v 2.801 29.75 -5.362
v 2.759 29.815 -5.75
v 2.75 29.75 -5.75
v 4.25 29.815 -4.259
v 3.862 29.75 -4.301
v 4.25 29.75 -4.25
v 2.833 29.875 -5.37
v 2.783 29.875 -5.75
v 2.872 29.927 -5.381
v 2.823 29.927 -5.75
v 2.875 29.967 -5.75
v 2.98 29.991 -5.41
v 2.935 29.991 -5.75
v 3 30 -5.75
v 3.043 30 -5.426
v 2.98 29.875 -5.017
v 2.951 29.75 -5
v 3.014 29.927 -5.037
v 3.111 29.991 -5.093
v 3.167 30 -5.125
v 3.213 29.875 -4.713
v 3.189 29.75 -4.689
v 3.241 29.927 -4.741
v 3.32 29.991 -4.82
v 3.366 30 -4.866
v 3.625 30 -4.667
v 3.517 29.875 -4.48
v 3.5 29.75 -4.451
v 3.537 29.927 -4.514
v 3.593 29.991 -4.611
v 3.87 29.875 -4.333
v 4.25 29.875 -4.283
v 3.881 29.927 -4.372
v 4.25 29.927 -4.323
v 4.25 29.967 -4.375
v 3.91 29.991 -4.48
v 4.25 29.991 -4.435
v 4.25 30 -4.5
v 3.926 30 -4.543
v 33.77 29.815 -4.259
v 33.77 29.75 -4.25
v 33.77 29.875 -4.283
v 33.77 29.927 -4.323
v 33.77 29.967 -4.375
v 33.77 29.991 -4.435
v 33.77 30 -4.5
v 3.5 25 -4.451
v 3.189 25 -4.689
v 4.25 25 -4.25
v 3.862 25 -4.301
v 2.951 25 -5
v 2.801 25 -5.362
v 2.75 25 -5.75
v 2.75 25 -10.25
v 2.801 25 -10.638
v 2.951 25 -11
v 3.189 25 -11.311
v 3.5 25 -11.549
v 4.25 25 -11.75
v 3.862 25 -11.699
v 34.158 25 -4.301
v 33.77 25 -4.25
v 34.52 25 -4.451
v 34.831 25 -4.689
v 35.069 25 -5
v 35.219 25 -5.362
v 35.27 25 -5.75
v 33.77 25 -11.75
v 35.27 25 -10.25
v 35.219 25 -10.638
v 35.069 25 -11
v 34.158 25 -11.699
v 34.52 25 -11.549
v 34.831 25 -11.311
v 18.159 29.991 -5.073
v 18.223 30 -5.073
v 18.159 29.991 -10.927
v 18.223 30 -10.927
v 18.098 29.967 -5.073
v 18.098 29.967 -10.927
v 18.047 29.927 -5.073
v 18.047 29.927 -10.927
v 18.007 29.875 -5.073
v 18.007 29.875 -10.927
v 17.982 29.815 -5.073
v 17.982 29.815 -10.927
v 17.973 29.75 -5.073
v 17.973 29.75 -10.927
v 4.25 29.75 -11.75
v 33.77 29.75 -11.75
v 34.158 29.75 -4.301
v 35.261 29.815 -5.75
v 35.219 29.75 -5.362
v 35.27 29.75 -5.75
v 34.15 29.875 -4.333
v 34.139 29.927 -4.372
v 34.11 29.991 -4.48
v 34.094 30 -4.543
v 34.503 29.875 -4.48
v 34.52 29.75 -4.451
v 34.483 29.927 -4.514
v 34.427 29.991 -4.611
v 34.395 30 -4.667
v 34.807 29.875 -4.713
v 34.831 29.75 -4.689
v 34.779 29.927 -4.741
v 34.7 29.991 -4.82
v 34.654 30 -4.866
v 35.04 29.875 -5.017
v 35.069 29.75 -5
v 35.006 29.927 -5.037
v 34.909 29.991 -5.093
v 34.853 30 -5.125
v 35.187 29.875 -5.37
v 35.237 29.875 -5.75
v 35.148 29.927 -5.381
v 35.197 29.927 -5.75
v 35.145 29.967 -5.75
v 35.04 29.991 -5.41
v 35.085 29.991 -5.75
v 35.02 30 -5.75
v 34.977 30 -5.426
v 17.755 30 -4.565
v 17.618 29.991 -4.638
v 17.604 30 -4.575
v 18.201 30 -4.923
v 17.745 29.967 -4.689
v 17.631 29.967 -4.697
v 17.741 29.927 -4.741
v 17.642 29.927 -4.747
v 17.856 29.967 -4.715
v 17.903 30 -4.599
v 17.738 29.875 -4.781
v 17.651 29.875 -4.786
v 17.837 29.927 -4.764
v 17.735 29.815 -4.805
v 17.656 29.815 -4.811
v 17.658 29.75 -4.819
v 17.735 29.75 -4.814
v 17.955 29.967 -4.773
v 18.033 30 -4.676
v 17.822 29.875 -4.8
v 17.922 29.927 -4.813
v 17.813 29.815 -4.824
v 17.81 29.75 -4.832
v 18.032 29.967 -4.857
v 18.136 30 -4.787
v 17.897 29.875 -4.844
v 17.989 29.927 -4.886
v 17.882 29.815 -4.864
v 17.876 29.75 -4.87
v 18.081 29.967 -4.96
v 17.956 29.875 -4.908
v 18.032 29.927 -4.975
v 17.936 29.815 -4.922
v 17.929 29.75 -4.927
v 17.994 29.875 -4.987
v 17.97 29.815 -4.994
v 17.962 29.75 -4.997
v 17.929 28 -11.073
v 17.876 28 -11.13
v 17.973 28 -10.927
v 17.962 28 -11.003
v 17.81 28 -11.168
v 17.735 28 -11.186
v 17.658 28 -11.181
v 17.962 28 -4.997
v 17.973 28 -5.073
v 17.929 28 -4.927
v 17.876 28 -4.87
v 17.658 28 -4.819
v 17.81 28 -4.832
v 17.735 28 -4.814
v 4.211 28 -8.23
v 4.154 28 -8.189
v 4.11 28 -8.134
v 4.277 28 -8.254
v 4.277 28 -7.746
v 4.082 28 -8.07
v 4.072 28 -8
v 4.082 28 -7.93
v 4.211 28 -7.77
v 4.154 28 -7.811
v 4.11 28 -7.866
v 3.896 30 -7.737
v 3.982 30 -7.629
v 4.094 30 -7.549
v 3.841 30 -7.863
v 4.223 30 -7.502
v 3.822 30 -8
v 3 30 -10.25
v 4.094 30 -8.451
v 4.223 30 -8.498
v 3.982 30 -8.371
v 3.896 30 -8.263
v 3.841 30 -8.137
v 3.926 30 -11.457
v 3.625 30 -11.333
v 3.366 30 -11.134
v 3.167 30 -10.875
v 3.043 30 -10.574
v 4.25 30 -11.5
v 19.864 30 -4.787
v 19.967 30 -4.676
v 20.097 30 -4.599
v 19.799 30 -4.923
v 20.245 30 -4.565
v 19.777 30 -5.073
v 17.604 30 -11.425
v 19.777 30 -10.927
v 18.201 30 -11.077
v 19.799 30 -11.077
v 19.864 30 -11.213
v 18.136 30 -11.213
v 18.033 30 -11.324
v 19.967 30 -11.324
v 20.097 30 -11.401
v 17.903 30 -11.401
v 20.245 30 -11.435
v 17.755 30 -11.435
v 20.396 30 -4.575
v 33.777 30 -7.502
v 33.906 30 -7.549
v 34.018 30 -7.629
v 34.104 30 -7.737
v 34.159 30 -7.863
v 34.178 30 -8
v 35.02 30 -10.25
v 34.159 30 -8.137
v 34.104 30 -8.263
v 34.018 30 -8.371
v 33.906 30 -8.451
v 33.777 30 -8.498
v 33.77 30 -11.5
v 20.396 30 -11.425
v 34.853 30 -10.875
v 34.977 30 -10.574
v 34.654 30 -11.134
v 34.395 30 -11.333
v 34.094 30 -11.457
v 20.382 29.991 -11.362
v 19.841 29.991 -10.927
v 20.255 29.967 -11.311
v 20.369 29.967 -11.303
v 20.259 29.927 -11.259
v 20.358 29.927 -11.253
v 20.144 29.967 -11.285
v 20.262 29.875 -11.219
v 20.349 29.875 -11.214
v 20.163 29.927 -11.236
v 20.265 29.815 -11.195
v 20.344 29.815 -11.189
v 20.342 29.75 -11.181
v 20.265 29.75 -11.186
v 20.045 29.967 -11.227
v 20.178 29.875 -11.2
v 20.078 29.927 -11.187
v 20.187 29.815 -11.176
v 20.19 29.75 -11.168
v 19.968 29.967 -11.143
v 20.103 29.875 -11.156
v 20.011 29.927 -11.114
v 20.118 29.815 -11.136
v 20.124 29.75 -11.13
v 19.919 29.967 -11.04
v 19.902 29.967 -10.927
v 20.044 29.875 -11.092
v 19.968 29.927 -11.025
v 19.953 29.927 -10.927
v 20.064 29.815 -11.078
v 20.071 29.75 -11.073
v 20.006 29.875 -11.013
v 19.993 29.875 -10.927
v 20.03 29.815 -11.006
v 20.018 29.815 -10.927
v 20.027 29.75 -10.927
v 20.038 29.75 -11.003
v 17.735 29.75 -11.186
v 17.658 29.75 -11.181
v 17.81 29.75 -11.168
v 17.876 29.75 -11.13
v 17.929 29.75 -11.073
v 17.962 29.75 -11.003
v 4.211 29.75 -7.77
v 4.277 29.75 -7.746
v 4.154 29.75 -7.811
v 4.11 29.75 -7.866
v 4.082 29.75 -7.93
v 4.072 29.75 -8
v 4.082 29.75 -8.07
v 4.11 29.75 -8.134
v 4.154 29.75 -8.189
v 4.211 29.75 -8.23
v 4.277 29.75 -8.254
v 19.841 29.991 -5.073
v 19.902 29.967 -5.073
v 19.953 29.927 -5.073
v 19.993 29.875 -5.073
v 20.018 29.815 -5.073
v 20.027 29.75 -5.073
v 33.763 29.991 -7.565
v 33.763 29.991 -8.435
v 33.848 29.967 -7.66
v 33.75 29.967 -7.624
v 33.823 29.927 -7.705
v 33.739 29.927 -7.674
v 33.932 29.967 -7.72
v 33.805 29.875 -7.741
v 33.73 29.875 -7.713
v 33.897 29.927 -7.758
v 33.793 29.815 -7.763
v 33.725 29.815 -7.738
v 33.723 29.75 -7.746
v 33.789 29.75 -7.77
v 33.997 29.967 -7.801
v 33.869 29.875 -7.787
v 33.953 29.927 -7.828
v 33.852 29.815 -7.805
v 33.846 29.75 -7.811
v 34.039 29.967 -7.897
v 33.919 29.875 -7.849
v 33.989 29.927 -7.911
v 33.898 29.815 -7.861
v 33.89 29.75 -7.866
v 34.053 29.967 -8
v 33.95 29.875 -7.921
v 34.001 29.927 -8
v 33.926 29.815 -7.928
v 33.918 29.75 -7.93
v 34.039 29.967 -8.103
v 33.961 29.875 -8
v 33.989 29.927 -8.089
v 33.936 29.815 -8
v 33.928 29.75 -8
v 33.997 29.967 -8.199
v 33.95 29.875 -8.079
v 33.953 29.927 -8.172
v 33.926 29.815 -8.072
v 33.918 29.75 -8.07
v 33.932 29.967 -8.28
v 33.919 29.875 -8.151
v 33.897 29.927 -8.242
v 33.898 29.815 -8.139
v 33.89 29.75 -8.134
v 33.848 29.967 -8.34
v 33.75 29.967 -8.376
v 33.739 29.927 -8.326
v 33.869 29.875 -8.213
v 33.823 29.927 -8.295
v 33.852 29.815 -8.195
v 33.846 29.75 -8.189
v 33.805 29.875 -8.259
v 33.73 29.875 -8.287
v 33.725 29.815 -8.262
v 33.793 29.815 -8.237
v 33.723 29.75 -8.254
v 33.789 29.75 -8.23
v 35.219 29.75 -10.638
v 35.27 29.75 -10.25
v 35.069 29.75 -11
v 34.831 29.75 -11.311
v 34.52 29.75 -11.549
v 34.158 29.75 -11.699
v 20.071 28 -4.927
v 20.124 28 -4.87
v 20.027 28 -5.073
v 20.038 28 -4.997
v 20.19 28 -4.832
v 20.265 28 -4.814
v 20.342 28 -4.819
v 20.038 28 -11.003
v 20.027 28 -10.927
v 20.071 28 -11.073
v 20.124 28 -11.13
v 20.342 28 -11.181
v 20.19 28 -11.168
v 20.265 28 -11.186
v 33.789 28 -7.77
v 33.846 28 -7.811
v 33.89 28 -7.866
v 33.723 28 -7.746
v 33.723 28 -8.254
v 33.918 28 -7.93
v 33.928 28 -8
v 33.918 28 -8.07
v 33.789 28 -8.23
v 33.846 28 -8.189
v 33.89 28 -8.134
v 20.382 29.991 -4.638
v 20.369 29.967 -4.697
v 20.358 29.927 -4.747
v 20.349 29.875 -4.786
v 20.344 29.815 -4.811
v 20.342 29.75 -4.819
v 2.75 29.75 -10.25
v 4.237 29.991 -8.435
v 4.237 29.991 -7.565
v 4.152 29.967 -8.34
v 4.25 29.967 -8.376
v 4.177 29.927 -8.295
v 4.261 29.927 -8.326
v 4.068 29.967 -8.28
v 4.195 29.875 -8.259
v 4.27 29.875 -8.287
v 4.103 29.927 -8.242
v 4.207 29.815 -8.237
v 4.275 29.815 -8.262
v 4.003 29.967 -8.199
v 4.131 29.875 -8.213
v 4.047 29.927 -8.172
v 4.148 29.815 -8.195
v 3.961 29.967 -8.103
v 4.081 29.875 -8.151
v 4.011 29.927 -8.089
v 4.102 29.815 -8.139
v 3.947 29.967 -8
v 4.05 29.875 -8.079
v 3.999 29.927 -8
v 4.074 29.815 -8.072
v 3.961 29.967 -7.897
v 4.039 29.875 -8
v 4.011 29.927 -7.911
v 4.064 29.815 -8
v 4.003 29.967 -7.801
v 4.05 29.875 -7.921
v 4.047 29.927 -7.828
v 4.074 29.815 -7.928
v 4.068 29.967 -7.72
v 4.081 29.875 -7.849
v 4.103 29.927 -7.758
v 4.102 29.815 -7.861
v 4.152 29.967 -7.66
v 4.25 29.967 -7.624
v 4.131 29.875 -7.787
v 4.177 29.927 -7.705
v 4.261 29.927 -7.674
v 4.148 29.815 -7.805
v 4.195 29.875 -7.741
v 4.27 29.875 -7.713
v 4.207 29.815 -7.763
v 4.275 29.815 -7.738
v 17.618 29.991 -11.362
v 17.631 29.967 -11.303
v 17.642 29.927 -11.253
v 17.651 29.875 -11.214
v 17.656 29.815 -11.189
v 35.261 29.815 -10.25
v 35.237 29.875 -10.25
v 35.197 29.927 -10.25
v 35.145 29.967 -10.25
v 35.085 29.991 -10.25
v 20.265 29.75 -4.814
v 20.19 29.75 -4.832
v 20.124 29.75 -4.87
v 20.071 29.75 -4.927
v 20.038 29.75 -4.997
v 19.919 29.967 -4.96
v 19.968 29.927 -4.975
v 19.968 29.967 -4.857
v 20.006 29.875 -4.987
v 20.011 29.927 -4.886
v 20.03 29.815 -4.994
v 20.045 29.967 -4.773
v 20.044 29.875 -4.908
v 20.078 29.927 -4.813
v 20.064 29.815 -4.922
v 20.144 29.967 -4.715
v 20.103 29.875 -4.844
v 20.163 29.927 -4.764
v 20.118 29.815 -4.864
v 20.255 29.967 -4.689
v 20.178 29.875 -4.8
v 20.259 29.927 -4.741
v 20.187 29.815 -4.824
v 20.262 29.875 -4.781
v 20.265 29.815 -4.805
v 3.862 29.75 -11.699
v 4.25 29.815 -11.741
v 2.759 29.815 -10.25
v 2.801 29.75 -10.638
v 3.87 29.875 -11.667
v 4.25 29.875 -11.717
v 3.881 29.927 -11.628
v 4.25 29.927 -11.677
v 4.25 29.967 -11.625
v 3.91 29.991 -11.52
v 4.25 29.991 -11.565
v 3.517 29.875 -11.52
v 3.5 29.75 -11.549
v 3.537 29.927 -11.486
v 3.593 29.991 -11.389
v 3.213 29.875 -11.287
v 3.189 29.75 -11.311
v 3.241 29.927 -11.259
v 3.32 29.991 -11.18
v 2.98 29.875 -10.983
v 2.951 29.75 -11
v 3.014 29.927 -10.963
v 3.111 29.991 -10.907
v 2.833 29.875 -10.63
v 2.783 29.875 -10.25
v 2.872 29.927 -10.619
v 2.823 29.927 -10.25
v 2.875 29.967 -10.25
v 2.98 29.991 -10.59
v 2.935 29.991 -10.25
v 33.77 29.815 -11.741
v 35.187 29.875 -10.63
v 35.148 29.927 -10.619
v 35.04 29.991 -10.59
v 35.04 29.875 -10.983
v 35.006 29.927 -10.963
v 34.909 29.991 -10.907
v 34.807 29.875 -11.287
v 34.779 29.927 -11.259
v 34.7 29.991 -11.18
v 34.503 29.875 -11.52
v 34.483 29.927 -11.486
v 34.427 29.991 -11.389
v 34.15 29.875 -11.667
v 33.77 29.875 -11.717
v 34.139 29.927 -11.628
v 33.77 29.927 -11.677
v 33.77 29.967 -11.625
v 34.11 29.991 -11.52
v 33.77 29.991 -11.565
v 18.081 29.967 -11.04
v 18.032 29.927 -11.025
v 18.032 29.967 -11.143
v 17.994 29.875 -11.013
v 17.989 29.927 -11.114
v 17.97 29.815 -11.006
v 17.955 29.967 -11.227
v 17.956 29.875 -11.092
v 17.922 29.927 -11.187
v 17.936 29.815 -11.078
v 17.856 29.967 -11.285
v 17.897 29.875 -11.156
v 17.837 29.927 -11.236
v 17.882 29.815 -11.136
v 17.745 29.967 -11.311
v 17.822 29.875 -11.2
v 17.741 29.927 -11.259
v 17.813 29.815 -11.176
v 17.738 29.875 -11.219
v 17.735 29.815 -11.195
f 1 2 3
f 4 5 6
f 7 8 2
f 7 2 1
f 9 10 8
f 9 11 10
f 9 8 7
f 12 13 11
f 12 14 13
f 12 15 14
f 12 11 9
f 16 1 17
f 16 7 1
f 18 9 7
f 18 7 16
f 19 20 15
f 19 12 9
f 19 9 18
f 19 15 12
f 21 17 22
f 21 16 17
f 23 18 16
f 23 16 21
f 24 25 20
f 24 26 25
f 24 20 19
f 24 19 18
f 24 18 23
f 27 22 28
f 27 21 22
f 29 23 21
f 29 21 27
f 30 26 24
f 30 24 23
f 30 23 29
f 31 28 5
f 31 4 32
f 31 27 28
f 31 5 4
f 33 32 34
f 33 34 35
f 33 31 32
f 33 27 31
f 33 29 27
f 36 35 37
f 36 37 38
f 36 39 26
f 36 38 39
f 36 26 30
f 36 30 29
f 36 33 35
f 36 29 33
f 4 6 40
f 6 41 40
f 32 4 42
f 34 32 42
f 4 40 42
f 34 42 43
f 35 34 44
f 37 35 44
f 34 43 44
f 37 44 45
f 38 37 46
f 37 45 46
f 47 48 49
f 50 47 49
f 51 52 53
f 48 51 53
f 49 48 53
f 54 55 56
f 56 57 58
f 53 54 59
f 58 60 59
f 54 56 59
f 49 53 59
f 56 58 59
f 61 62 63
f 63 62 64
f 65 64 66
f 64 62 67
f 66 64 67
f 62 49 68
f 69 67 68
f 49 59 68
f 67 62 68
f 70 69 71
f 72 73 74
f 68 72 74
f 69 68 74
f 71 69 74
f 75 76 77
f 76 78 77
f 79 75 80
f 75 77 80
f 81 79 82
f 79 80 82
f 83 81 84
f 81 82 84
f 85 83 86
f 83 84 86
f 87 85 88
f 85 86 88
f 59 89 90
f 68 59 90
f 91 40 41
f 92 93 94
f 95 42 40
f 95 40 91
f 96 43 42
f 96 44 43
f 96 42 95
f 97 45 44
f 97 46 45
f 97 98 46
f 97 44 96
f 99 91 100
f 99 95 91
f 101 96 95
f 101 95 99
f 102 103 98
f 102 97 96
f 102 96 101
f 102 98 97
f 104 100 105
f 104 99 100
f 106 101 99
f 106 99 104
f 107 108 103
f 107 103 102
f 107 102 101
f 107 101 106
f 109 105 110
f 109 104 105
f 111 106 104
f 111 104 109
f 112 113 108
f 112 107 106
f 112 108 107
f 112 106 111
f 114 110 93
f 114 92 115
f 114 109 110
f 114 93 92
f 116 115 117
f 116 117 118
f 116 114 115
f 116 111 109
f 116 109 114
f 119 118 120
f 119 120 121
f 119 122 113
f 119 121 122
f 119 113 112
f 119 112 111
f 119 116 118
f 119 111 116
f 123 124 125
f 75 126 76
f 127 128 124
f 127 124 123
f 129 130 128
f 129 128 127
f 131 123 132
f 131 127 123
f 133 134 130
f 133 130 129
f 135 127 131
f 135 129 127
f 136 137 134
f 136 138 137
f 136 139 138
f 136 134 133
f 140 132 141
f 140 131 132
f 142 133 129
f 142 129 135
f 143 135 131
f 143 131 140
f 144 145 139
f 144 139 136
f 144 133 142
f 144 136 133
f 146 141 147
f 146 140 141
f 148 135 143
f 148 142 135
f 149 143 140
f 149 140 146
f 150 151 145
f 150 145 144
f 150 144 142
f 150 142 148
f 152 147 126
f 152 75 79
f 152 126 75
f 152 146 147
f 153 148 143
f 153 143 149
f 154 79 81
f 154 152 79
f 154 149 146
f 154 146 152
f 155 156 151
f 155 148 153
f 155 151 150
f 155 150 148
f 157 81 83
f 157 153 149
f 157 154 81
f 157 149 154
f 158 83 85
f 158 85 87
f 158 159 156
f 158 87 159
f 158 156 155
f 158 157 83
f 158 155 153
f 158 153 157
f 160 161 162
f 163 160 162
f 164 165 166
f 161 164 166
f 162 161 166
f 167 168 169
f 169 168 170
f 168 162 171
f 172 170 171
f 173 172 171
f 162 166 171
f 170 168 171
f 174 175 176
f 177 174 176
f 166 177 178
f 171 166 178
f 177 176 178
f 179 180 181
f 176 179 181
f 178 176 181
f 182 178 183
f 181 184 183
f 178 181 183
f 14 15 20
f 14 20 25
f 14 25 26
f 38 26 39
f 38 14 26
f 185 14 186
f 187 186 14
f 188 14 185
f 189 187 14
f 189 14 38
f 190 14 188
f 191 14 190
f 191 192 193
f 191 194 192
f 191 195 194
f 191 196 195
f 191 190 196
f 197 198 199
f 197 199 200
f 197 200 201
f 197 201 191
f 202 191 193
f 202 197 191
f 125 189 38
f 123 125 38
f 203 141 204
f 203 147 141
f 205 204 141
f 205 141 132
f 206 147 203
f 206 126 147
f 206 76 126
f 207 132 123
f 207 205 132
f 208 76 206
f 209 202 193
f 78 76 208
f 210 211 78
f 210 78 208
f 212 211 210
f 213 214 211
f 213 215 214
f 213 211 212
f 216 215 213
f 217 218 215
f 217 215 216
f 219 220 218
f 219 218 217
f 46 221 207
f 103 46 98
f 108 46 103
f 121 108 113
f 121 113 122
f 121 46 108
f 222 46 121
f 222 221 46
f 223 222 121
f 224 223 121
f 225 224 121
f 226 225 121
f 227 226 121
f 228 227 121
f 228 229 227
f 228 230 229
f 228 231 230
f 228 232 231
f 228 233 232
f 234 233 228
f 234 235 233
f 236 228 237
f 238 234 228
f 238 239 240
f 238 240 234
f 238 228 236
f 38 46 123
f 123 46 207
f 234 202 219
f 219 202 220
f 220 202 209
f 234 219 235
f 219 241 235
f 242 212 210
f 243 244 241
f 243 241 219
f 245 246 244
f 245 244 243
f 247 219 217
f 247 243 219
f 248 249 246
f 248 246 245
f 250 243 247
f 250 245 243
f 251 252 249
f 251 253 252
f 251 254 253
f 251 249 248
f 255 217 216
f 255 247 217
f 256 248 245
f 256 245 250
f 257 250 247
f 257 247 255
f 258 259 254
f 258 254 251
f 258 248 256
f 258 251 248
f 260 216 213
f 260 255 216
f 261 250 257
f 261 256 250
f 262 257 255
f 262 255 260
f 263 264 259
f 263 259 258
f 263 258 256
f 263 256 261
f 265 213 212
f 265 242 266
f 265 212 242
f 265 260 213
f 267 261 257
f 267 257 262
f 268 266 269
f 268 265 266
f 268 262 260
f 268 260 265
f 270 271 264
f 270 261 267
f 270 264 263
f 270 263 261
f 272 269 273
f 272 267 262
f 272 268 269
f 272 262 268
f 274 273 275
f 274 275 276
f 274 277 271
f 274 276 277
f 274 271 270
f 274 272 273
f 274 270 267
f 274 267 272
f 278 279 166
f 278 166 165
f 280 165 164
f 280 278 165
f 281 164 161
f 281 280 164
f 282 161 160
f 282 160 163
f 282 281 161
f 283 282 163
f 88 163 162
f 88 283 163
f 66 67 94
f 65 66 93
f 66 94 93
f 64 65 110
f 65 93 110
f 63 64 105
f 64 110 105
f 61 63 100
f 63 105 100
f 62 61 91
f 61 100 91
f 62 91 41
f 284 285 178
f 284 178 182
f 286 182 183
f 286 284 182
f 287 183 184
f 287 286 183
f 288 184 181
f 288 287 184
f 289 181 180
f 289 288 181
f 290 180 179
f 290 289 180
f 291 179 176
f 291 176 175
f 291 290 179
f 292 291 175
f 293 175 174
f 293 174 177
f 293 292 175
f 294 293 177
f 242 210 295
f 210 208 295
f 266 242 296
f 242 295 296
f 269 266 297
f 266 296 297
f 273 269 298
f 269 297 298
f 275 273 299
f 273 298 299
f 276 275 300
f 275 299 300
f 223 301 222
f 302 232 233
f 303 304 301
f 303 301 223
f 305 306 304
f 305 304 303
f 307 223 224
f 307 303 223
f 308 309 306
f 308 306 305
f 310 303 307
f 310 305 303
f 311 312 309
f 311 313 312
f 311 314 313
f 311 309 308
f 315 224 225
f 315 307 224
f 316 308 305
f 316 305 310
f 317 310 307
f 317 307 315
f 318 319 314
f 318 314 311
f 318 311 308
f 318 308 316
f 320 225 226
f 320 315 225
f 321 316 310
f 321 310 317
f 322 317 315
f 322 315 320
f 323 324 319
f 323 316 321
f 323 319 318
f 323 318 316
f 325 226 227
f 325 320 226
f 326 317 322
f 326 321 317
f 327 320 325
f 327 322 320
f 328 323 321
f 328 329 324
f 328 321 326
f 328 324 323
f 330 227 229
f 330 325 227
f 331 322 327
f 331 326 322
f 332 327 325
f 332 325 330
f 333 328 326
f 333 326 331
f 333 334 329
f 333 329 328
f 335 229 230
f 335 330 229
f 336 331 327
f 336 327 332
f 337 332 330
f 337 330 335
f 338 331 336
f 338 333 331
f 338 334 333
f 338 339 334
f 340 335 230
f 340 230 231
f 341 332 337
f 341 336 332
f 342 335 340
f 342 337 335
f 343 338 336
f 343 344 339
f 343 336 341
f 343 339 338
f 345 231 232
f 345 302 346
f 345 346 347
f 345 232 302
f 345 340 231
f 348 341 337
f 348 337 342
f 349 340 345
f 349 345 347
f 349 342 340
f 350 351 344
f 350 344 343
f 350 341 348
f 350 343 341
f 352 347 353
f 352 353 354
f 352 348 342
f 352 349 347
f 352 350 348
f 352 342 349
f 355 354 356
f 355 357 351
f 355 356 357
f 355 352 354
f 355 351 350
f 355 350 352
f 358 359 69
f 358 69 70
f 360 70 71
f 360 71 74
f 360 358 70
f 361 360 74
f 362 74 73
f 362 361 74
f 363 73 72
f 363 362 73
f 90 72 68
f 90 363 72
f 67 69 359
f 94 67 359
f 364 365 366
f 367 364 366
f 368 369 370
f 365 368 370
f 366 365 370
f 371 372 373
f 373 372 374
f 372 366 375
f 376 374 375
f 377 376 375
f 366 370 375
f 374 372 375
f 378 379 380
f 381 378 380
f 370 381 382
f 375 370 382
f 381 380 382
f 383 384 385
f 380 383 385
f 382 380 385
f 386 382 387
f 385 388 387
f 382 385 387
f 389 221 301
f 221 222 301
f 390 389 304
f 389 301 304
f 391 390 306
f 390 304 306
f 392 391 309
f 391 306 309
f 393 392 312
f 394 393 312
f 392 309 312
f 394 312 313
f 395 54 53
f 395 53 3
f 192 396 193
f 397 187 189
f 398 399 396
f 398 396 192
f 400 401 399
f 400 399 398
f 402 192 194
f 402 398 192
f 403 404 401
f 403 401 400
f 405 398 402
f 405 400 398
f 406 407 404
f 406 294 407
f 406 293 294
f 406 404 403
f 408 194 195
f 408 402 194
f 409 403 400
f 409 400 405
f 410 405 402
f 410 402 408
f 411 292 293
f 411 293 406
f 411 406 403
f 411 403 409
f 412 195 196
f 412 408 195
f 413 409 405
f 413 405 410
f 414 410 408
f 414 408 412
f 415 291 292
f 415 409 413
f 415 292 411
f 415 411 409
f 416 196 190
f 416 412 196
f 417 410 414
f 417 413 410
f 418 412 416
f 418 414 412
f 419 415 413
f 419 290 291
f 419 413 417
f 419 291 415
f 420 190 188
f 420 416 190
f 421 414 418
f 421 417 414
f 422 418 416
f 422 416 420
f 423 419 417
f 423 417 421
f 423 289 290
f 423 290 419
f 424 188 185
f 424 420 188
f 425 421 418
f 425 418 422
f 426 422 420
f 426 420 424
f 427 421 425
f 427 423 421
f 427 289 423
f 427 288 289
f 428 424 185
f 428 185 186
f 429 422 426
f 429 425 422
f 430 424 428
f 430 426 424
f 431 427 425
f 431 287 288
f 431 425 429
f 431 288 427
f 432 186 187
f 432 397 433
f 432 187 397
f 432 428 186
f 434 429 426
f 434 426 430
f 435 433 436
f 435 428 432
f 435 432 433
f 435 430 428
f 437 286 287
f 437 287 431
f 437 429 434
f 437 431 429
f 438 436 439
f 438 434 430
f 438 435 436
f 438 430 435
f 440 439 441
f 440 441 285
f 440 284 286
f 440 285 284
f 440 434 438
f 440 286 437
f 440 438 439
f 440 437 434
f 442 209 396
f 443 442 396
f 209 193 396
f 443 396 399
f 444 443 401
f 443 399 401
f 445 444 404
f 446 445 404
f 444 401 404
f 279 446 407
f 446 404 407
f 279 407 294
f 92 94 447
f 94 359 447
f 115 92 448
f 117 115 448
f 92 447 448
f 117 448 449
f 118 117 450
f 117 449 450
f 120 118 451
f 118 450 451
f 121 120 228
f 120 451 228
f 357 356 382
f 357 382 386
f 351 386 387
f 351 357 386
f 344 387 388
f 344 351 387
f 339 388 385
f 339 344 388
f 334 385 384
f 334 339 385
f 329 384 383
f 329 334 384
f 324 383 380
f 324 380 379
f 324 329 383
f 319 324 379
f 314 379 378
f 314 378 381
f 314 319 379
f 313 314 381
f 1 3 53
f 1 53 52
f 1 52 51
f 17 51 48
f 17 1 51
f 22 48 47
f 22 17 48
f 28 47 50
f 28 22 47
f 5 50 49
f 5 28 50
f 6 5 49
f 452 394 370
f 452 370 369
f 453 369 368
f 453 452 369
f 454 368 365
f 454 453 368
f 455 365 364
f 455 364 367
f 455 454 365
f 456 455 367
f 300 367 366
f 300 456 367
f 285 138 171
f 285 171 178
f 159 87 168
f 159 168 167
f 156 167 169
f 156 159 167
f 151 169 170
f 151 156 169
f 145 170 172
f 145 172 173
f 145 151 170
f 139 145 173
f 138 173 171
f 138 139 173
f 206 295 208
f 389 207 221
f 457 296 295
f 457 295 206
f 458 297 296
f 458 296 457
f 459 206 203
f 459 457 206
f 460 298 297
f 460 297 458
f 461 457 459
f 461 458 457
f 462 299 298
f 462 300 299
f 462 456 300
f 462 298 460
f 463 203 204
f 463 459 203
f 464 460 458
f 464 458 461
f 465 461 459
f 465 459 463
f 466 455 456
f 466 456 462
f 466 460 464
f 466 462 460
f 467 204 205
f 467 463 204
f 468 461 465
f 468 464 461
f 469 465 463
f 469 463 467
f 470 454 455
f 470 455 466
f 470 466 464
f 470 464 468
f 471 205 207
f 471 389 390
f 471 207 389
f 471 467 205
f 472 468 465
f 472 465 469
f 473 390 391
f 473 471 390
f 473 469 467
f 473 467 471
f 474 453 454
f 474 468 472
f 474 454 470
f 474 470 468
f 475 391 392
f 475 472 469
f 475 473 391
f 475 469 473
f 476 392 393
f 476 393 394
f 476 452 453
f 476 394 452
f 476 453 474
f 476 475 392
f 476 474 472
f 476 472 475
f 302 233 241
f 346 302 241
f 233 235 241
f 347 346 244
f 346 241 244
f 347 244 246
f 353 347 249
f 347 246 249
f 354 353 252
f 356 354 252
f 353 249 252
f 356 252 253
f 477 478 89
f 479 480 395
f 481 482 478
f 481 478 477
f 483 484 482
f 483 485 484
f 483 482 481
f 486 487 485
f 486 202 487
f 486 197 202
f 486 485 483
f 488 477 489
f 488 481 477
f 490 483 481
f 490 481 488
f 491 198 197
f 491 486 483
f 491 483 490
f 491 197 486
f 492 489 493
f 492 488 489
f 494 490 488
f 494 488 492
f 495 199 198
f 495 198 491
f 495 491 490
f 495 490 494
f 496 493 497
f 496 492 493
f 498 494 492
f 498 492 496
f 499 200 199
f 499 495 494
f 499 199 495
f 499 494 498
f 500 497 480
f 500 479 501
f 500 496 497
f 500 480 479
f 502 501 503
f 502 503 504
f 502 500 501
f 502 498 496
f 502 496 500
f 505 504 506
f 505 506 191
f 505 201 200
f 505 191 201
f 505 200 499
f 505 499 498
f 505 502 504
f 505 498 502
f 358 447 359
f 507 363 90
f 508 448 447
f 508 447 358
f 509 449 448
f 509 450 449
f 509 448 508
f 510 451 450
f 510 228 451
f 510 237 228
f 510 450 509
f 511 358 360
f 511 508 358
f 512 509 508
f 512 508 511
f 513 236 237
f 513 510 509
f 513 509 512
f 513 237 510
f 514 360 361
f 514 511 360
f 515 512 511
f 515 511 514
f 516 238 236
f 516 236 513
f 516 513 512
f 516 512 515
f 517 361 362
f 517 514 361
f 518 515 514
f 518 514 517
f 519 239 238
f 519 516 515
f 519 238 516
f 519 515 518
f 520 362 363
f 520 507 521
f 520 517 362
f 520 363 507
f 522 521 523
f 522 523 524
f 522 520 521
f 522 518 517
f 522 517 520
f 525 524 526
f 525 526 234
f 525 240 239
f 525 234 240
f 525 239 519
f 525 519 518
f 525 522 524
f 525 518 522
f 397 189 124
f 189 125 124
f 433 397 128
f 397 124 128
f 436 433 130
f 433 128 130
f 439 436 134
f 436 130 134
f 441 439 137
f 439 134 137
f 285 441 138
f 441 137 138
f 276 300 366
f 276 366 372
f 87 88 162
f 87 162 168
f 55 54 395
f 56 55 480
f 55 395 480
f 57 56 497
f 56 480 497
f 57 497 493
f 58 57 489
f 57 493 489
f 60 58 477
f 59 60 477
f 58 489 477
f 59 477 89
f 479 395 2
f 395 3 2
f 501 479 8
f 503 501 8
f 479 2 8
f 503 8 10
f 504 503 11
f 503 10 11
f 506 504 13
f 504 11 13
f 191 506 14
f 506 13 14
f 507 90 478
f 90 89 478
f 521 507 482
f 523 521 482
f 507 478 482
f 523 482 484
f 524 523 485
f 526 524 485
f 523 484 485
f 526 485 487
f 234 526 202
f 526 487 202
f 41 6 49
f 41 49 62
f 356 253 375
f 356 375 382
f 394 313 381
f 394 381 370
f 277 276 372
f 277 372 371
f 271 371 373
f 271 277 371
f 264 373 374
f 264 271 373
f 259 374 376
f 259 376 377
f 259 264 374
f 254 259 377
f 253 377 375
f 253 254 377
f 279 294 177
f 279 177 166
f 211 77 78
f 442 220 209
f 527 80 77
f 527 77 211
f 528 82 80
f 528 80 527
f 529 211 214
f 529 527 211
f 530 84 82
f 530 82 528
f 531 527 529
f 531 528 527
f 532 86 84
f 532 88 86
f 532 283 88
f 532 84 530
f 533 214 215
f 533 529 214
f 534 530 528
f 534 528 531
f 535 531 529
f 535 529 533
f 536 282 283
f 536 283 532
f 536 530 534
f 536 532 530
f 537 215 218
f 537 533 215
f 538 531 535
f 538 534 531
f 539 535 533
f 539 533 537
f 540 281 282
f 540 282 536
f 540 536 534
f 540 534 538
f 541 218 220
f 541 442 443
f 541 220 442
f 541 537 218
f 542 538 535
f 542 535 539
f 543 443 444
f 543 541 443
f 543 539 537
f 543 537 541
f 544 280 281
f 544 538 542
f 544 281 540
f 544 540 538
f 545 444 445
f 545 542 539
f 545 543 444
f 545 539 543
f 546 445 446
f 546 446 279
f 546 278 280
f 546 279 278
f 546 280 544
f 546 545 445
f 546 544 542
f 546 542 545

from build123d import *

# Parameters (mm, degrees)
PAD001_DEPTH            = 10
BODY001_PLACEMENT_ANGLE = 90
PAD003_DEPTH            = 10
BODY003_PLACEMENT_ANGLE = 270
BOX005_W                = 32.52
BOX005_H                = 5
BOX005_DEPTH            = 7.5
FILLET002_R             = 1.5
FILLET003_R             = 0.25


with BuildPart() as body001:
    # Sketch001 → Pad001 (new body)
    with BuildSketch(Plane.XZ):
        with BuildLine():
            Line((-0.253994, 6.623128), (-3.180974, -6.757813))
            ThreePointArc((-3.180974, -6.757813), (-3.12952, -6.976398), (-2.926979, -7.073373))
            Line((-2.926979, -7.073373), (2.926979, -7.073373))
            ThreePointArc((2.926979, -7.073373), (3.12952, -6.976398), (3.180974, -6.757813))
            Line((3.180974, -6.757813), (0.253994, 6.623128))
            ThreePointArc((0.253994, 6.623128), (0, 6.827569), (-0.253994, 6.623128))
        make_face()
    extrude(amount=PAD001_DEPTH)


with BuildPart() as body001_1:
    # Body001 placement: moved
    add(body001.part.moved(Location((27.1, 63, -8))).rotate(Axis((27.1, 63, -8), (0, 1, 0)), BODY001_PLACEMENT_ANGLE))


with BuildPart() as wedge_holes:
    # Sketch003 → Pad003 (new body)
    with BuildSketch(Plane.XZ):
        with BuildLine():
            Line((-0.253994, 6.623128), (-3.180974, -6.757813))
            ThreePointArc((-3.180974, -6.757813), (-3.12952, -6.976398), (-2.926979, -7.073373))
            Line((-2.926979, -7.073373), (2.926979, -7.073373))
            ThreePointArc((2.926979, -7.073373), (3.12952, -6.976398), (3.180974, -6.757813))
            Line((3.180974, -6.757813), (0.253994, 6.623128))
            ThreePointArc((0.253994, 6.623128), (0, 6.827569), (-0.253994, 6.623128))
        make_face()
    extrude(amount=PAD003_DEPTH)


with BuildPart() as wedge_holes_1:
    # Body003 placement: moved
    add(wedge_holes.part.moved(Location((10.9, 63, -8))).rotate(Axis((10.9, 63, -8), (0, 1, 0)), BODY003_PLACEMENT_ANGLE))

    # Fusion003: union Body001
    add(body001_1.part)


with BuildPart() as wedge_holes_2:
    # Fusion003 placement: moved
    add(wedge_holes_1.part.moved(Location((0, -25, 0))))


with BuildPart() as fillet003:
    # Box005 → Box005 (new body)
    with BuildSketch(Plane(origin=(2.75, 25, -11.75), x_dir=(1, 0, 0), z_dir=(0, 0, 1))):
        with Locations((16.26, 2.5)):
            Rectangle(BOX005_W, BOX005_H)
    extrude(amount=BOX005_DEPTH)

    # Fillet002
    fillet002_edges = [fillet003.edges().sort_by_distance(p)[0] for p in [
        (2.75, 27.5, -4.25),
        (2.75, 27.5, -11.75),
        (35.27, 27.5, -4.25),
        (35.27, 27.5, -11.75),
    ]]
    fillet(fillet002_edges, radius=FILLET002_R)

    # Cut003: cut wedge holes
    add(wedge_holes_2.part, mode=Mode.SUBTRACT)

    # Fillet003
    fillet003_edges = [fillet003.edges().sort_by_distance(p)[0] for p in [
        (2.75, 30, -8),
        (3.18934, 30, -11.31066),
        (19.01, 30, -11.75),
        (34.83066, 30, -11.31066),
        (35.27, 30, -8),
        (3.18934, 30, -4.68934),
        (34.83066, 30, -4.68934),
        (19.01, 30, -4.25),
        (4.072431, 30, -8),
        (10.967343, 30, -6.282516),
        (17.876398, 30, -4.87048),
        (17.973373, 30, -8),
        (17.876398, 30, -11.12952),
        (10.967343, 30, -9.717484),
        (33.927569, 30, -8),
        (27.032657, 30, -9.717484),
        (20.123602, 30, -11.12952),
        (20.026627, 30, -8),
        (20.123602, 30, -4.87048),
        (27.032657, 30, -6.282516),
    ]]
    fillet(fillet003_edges, radius=FILLET003_R)


solid = fillet003.part
